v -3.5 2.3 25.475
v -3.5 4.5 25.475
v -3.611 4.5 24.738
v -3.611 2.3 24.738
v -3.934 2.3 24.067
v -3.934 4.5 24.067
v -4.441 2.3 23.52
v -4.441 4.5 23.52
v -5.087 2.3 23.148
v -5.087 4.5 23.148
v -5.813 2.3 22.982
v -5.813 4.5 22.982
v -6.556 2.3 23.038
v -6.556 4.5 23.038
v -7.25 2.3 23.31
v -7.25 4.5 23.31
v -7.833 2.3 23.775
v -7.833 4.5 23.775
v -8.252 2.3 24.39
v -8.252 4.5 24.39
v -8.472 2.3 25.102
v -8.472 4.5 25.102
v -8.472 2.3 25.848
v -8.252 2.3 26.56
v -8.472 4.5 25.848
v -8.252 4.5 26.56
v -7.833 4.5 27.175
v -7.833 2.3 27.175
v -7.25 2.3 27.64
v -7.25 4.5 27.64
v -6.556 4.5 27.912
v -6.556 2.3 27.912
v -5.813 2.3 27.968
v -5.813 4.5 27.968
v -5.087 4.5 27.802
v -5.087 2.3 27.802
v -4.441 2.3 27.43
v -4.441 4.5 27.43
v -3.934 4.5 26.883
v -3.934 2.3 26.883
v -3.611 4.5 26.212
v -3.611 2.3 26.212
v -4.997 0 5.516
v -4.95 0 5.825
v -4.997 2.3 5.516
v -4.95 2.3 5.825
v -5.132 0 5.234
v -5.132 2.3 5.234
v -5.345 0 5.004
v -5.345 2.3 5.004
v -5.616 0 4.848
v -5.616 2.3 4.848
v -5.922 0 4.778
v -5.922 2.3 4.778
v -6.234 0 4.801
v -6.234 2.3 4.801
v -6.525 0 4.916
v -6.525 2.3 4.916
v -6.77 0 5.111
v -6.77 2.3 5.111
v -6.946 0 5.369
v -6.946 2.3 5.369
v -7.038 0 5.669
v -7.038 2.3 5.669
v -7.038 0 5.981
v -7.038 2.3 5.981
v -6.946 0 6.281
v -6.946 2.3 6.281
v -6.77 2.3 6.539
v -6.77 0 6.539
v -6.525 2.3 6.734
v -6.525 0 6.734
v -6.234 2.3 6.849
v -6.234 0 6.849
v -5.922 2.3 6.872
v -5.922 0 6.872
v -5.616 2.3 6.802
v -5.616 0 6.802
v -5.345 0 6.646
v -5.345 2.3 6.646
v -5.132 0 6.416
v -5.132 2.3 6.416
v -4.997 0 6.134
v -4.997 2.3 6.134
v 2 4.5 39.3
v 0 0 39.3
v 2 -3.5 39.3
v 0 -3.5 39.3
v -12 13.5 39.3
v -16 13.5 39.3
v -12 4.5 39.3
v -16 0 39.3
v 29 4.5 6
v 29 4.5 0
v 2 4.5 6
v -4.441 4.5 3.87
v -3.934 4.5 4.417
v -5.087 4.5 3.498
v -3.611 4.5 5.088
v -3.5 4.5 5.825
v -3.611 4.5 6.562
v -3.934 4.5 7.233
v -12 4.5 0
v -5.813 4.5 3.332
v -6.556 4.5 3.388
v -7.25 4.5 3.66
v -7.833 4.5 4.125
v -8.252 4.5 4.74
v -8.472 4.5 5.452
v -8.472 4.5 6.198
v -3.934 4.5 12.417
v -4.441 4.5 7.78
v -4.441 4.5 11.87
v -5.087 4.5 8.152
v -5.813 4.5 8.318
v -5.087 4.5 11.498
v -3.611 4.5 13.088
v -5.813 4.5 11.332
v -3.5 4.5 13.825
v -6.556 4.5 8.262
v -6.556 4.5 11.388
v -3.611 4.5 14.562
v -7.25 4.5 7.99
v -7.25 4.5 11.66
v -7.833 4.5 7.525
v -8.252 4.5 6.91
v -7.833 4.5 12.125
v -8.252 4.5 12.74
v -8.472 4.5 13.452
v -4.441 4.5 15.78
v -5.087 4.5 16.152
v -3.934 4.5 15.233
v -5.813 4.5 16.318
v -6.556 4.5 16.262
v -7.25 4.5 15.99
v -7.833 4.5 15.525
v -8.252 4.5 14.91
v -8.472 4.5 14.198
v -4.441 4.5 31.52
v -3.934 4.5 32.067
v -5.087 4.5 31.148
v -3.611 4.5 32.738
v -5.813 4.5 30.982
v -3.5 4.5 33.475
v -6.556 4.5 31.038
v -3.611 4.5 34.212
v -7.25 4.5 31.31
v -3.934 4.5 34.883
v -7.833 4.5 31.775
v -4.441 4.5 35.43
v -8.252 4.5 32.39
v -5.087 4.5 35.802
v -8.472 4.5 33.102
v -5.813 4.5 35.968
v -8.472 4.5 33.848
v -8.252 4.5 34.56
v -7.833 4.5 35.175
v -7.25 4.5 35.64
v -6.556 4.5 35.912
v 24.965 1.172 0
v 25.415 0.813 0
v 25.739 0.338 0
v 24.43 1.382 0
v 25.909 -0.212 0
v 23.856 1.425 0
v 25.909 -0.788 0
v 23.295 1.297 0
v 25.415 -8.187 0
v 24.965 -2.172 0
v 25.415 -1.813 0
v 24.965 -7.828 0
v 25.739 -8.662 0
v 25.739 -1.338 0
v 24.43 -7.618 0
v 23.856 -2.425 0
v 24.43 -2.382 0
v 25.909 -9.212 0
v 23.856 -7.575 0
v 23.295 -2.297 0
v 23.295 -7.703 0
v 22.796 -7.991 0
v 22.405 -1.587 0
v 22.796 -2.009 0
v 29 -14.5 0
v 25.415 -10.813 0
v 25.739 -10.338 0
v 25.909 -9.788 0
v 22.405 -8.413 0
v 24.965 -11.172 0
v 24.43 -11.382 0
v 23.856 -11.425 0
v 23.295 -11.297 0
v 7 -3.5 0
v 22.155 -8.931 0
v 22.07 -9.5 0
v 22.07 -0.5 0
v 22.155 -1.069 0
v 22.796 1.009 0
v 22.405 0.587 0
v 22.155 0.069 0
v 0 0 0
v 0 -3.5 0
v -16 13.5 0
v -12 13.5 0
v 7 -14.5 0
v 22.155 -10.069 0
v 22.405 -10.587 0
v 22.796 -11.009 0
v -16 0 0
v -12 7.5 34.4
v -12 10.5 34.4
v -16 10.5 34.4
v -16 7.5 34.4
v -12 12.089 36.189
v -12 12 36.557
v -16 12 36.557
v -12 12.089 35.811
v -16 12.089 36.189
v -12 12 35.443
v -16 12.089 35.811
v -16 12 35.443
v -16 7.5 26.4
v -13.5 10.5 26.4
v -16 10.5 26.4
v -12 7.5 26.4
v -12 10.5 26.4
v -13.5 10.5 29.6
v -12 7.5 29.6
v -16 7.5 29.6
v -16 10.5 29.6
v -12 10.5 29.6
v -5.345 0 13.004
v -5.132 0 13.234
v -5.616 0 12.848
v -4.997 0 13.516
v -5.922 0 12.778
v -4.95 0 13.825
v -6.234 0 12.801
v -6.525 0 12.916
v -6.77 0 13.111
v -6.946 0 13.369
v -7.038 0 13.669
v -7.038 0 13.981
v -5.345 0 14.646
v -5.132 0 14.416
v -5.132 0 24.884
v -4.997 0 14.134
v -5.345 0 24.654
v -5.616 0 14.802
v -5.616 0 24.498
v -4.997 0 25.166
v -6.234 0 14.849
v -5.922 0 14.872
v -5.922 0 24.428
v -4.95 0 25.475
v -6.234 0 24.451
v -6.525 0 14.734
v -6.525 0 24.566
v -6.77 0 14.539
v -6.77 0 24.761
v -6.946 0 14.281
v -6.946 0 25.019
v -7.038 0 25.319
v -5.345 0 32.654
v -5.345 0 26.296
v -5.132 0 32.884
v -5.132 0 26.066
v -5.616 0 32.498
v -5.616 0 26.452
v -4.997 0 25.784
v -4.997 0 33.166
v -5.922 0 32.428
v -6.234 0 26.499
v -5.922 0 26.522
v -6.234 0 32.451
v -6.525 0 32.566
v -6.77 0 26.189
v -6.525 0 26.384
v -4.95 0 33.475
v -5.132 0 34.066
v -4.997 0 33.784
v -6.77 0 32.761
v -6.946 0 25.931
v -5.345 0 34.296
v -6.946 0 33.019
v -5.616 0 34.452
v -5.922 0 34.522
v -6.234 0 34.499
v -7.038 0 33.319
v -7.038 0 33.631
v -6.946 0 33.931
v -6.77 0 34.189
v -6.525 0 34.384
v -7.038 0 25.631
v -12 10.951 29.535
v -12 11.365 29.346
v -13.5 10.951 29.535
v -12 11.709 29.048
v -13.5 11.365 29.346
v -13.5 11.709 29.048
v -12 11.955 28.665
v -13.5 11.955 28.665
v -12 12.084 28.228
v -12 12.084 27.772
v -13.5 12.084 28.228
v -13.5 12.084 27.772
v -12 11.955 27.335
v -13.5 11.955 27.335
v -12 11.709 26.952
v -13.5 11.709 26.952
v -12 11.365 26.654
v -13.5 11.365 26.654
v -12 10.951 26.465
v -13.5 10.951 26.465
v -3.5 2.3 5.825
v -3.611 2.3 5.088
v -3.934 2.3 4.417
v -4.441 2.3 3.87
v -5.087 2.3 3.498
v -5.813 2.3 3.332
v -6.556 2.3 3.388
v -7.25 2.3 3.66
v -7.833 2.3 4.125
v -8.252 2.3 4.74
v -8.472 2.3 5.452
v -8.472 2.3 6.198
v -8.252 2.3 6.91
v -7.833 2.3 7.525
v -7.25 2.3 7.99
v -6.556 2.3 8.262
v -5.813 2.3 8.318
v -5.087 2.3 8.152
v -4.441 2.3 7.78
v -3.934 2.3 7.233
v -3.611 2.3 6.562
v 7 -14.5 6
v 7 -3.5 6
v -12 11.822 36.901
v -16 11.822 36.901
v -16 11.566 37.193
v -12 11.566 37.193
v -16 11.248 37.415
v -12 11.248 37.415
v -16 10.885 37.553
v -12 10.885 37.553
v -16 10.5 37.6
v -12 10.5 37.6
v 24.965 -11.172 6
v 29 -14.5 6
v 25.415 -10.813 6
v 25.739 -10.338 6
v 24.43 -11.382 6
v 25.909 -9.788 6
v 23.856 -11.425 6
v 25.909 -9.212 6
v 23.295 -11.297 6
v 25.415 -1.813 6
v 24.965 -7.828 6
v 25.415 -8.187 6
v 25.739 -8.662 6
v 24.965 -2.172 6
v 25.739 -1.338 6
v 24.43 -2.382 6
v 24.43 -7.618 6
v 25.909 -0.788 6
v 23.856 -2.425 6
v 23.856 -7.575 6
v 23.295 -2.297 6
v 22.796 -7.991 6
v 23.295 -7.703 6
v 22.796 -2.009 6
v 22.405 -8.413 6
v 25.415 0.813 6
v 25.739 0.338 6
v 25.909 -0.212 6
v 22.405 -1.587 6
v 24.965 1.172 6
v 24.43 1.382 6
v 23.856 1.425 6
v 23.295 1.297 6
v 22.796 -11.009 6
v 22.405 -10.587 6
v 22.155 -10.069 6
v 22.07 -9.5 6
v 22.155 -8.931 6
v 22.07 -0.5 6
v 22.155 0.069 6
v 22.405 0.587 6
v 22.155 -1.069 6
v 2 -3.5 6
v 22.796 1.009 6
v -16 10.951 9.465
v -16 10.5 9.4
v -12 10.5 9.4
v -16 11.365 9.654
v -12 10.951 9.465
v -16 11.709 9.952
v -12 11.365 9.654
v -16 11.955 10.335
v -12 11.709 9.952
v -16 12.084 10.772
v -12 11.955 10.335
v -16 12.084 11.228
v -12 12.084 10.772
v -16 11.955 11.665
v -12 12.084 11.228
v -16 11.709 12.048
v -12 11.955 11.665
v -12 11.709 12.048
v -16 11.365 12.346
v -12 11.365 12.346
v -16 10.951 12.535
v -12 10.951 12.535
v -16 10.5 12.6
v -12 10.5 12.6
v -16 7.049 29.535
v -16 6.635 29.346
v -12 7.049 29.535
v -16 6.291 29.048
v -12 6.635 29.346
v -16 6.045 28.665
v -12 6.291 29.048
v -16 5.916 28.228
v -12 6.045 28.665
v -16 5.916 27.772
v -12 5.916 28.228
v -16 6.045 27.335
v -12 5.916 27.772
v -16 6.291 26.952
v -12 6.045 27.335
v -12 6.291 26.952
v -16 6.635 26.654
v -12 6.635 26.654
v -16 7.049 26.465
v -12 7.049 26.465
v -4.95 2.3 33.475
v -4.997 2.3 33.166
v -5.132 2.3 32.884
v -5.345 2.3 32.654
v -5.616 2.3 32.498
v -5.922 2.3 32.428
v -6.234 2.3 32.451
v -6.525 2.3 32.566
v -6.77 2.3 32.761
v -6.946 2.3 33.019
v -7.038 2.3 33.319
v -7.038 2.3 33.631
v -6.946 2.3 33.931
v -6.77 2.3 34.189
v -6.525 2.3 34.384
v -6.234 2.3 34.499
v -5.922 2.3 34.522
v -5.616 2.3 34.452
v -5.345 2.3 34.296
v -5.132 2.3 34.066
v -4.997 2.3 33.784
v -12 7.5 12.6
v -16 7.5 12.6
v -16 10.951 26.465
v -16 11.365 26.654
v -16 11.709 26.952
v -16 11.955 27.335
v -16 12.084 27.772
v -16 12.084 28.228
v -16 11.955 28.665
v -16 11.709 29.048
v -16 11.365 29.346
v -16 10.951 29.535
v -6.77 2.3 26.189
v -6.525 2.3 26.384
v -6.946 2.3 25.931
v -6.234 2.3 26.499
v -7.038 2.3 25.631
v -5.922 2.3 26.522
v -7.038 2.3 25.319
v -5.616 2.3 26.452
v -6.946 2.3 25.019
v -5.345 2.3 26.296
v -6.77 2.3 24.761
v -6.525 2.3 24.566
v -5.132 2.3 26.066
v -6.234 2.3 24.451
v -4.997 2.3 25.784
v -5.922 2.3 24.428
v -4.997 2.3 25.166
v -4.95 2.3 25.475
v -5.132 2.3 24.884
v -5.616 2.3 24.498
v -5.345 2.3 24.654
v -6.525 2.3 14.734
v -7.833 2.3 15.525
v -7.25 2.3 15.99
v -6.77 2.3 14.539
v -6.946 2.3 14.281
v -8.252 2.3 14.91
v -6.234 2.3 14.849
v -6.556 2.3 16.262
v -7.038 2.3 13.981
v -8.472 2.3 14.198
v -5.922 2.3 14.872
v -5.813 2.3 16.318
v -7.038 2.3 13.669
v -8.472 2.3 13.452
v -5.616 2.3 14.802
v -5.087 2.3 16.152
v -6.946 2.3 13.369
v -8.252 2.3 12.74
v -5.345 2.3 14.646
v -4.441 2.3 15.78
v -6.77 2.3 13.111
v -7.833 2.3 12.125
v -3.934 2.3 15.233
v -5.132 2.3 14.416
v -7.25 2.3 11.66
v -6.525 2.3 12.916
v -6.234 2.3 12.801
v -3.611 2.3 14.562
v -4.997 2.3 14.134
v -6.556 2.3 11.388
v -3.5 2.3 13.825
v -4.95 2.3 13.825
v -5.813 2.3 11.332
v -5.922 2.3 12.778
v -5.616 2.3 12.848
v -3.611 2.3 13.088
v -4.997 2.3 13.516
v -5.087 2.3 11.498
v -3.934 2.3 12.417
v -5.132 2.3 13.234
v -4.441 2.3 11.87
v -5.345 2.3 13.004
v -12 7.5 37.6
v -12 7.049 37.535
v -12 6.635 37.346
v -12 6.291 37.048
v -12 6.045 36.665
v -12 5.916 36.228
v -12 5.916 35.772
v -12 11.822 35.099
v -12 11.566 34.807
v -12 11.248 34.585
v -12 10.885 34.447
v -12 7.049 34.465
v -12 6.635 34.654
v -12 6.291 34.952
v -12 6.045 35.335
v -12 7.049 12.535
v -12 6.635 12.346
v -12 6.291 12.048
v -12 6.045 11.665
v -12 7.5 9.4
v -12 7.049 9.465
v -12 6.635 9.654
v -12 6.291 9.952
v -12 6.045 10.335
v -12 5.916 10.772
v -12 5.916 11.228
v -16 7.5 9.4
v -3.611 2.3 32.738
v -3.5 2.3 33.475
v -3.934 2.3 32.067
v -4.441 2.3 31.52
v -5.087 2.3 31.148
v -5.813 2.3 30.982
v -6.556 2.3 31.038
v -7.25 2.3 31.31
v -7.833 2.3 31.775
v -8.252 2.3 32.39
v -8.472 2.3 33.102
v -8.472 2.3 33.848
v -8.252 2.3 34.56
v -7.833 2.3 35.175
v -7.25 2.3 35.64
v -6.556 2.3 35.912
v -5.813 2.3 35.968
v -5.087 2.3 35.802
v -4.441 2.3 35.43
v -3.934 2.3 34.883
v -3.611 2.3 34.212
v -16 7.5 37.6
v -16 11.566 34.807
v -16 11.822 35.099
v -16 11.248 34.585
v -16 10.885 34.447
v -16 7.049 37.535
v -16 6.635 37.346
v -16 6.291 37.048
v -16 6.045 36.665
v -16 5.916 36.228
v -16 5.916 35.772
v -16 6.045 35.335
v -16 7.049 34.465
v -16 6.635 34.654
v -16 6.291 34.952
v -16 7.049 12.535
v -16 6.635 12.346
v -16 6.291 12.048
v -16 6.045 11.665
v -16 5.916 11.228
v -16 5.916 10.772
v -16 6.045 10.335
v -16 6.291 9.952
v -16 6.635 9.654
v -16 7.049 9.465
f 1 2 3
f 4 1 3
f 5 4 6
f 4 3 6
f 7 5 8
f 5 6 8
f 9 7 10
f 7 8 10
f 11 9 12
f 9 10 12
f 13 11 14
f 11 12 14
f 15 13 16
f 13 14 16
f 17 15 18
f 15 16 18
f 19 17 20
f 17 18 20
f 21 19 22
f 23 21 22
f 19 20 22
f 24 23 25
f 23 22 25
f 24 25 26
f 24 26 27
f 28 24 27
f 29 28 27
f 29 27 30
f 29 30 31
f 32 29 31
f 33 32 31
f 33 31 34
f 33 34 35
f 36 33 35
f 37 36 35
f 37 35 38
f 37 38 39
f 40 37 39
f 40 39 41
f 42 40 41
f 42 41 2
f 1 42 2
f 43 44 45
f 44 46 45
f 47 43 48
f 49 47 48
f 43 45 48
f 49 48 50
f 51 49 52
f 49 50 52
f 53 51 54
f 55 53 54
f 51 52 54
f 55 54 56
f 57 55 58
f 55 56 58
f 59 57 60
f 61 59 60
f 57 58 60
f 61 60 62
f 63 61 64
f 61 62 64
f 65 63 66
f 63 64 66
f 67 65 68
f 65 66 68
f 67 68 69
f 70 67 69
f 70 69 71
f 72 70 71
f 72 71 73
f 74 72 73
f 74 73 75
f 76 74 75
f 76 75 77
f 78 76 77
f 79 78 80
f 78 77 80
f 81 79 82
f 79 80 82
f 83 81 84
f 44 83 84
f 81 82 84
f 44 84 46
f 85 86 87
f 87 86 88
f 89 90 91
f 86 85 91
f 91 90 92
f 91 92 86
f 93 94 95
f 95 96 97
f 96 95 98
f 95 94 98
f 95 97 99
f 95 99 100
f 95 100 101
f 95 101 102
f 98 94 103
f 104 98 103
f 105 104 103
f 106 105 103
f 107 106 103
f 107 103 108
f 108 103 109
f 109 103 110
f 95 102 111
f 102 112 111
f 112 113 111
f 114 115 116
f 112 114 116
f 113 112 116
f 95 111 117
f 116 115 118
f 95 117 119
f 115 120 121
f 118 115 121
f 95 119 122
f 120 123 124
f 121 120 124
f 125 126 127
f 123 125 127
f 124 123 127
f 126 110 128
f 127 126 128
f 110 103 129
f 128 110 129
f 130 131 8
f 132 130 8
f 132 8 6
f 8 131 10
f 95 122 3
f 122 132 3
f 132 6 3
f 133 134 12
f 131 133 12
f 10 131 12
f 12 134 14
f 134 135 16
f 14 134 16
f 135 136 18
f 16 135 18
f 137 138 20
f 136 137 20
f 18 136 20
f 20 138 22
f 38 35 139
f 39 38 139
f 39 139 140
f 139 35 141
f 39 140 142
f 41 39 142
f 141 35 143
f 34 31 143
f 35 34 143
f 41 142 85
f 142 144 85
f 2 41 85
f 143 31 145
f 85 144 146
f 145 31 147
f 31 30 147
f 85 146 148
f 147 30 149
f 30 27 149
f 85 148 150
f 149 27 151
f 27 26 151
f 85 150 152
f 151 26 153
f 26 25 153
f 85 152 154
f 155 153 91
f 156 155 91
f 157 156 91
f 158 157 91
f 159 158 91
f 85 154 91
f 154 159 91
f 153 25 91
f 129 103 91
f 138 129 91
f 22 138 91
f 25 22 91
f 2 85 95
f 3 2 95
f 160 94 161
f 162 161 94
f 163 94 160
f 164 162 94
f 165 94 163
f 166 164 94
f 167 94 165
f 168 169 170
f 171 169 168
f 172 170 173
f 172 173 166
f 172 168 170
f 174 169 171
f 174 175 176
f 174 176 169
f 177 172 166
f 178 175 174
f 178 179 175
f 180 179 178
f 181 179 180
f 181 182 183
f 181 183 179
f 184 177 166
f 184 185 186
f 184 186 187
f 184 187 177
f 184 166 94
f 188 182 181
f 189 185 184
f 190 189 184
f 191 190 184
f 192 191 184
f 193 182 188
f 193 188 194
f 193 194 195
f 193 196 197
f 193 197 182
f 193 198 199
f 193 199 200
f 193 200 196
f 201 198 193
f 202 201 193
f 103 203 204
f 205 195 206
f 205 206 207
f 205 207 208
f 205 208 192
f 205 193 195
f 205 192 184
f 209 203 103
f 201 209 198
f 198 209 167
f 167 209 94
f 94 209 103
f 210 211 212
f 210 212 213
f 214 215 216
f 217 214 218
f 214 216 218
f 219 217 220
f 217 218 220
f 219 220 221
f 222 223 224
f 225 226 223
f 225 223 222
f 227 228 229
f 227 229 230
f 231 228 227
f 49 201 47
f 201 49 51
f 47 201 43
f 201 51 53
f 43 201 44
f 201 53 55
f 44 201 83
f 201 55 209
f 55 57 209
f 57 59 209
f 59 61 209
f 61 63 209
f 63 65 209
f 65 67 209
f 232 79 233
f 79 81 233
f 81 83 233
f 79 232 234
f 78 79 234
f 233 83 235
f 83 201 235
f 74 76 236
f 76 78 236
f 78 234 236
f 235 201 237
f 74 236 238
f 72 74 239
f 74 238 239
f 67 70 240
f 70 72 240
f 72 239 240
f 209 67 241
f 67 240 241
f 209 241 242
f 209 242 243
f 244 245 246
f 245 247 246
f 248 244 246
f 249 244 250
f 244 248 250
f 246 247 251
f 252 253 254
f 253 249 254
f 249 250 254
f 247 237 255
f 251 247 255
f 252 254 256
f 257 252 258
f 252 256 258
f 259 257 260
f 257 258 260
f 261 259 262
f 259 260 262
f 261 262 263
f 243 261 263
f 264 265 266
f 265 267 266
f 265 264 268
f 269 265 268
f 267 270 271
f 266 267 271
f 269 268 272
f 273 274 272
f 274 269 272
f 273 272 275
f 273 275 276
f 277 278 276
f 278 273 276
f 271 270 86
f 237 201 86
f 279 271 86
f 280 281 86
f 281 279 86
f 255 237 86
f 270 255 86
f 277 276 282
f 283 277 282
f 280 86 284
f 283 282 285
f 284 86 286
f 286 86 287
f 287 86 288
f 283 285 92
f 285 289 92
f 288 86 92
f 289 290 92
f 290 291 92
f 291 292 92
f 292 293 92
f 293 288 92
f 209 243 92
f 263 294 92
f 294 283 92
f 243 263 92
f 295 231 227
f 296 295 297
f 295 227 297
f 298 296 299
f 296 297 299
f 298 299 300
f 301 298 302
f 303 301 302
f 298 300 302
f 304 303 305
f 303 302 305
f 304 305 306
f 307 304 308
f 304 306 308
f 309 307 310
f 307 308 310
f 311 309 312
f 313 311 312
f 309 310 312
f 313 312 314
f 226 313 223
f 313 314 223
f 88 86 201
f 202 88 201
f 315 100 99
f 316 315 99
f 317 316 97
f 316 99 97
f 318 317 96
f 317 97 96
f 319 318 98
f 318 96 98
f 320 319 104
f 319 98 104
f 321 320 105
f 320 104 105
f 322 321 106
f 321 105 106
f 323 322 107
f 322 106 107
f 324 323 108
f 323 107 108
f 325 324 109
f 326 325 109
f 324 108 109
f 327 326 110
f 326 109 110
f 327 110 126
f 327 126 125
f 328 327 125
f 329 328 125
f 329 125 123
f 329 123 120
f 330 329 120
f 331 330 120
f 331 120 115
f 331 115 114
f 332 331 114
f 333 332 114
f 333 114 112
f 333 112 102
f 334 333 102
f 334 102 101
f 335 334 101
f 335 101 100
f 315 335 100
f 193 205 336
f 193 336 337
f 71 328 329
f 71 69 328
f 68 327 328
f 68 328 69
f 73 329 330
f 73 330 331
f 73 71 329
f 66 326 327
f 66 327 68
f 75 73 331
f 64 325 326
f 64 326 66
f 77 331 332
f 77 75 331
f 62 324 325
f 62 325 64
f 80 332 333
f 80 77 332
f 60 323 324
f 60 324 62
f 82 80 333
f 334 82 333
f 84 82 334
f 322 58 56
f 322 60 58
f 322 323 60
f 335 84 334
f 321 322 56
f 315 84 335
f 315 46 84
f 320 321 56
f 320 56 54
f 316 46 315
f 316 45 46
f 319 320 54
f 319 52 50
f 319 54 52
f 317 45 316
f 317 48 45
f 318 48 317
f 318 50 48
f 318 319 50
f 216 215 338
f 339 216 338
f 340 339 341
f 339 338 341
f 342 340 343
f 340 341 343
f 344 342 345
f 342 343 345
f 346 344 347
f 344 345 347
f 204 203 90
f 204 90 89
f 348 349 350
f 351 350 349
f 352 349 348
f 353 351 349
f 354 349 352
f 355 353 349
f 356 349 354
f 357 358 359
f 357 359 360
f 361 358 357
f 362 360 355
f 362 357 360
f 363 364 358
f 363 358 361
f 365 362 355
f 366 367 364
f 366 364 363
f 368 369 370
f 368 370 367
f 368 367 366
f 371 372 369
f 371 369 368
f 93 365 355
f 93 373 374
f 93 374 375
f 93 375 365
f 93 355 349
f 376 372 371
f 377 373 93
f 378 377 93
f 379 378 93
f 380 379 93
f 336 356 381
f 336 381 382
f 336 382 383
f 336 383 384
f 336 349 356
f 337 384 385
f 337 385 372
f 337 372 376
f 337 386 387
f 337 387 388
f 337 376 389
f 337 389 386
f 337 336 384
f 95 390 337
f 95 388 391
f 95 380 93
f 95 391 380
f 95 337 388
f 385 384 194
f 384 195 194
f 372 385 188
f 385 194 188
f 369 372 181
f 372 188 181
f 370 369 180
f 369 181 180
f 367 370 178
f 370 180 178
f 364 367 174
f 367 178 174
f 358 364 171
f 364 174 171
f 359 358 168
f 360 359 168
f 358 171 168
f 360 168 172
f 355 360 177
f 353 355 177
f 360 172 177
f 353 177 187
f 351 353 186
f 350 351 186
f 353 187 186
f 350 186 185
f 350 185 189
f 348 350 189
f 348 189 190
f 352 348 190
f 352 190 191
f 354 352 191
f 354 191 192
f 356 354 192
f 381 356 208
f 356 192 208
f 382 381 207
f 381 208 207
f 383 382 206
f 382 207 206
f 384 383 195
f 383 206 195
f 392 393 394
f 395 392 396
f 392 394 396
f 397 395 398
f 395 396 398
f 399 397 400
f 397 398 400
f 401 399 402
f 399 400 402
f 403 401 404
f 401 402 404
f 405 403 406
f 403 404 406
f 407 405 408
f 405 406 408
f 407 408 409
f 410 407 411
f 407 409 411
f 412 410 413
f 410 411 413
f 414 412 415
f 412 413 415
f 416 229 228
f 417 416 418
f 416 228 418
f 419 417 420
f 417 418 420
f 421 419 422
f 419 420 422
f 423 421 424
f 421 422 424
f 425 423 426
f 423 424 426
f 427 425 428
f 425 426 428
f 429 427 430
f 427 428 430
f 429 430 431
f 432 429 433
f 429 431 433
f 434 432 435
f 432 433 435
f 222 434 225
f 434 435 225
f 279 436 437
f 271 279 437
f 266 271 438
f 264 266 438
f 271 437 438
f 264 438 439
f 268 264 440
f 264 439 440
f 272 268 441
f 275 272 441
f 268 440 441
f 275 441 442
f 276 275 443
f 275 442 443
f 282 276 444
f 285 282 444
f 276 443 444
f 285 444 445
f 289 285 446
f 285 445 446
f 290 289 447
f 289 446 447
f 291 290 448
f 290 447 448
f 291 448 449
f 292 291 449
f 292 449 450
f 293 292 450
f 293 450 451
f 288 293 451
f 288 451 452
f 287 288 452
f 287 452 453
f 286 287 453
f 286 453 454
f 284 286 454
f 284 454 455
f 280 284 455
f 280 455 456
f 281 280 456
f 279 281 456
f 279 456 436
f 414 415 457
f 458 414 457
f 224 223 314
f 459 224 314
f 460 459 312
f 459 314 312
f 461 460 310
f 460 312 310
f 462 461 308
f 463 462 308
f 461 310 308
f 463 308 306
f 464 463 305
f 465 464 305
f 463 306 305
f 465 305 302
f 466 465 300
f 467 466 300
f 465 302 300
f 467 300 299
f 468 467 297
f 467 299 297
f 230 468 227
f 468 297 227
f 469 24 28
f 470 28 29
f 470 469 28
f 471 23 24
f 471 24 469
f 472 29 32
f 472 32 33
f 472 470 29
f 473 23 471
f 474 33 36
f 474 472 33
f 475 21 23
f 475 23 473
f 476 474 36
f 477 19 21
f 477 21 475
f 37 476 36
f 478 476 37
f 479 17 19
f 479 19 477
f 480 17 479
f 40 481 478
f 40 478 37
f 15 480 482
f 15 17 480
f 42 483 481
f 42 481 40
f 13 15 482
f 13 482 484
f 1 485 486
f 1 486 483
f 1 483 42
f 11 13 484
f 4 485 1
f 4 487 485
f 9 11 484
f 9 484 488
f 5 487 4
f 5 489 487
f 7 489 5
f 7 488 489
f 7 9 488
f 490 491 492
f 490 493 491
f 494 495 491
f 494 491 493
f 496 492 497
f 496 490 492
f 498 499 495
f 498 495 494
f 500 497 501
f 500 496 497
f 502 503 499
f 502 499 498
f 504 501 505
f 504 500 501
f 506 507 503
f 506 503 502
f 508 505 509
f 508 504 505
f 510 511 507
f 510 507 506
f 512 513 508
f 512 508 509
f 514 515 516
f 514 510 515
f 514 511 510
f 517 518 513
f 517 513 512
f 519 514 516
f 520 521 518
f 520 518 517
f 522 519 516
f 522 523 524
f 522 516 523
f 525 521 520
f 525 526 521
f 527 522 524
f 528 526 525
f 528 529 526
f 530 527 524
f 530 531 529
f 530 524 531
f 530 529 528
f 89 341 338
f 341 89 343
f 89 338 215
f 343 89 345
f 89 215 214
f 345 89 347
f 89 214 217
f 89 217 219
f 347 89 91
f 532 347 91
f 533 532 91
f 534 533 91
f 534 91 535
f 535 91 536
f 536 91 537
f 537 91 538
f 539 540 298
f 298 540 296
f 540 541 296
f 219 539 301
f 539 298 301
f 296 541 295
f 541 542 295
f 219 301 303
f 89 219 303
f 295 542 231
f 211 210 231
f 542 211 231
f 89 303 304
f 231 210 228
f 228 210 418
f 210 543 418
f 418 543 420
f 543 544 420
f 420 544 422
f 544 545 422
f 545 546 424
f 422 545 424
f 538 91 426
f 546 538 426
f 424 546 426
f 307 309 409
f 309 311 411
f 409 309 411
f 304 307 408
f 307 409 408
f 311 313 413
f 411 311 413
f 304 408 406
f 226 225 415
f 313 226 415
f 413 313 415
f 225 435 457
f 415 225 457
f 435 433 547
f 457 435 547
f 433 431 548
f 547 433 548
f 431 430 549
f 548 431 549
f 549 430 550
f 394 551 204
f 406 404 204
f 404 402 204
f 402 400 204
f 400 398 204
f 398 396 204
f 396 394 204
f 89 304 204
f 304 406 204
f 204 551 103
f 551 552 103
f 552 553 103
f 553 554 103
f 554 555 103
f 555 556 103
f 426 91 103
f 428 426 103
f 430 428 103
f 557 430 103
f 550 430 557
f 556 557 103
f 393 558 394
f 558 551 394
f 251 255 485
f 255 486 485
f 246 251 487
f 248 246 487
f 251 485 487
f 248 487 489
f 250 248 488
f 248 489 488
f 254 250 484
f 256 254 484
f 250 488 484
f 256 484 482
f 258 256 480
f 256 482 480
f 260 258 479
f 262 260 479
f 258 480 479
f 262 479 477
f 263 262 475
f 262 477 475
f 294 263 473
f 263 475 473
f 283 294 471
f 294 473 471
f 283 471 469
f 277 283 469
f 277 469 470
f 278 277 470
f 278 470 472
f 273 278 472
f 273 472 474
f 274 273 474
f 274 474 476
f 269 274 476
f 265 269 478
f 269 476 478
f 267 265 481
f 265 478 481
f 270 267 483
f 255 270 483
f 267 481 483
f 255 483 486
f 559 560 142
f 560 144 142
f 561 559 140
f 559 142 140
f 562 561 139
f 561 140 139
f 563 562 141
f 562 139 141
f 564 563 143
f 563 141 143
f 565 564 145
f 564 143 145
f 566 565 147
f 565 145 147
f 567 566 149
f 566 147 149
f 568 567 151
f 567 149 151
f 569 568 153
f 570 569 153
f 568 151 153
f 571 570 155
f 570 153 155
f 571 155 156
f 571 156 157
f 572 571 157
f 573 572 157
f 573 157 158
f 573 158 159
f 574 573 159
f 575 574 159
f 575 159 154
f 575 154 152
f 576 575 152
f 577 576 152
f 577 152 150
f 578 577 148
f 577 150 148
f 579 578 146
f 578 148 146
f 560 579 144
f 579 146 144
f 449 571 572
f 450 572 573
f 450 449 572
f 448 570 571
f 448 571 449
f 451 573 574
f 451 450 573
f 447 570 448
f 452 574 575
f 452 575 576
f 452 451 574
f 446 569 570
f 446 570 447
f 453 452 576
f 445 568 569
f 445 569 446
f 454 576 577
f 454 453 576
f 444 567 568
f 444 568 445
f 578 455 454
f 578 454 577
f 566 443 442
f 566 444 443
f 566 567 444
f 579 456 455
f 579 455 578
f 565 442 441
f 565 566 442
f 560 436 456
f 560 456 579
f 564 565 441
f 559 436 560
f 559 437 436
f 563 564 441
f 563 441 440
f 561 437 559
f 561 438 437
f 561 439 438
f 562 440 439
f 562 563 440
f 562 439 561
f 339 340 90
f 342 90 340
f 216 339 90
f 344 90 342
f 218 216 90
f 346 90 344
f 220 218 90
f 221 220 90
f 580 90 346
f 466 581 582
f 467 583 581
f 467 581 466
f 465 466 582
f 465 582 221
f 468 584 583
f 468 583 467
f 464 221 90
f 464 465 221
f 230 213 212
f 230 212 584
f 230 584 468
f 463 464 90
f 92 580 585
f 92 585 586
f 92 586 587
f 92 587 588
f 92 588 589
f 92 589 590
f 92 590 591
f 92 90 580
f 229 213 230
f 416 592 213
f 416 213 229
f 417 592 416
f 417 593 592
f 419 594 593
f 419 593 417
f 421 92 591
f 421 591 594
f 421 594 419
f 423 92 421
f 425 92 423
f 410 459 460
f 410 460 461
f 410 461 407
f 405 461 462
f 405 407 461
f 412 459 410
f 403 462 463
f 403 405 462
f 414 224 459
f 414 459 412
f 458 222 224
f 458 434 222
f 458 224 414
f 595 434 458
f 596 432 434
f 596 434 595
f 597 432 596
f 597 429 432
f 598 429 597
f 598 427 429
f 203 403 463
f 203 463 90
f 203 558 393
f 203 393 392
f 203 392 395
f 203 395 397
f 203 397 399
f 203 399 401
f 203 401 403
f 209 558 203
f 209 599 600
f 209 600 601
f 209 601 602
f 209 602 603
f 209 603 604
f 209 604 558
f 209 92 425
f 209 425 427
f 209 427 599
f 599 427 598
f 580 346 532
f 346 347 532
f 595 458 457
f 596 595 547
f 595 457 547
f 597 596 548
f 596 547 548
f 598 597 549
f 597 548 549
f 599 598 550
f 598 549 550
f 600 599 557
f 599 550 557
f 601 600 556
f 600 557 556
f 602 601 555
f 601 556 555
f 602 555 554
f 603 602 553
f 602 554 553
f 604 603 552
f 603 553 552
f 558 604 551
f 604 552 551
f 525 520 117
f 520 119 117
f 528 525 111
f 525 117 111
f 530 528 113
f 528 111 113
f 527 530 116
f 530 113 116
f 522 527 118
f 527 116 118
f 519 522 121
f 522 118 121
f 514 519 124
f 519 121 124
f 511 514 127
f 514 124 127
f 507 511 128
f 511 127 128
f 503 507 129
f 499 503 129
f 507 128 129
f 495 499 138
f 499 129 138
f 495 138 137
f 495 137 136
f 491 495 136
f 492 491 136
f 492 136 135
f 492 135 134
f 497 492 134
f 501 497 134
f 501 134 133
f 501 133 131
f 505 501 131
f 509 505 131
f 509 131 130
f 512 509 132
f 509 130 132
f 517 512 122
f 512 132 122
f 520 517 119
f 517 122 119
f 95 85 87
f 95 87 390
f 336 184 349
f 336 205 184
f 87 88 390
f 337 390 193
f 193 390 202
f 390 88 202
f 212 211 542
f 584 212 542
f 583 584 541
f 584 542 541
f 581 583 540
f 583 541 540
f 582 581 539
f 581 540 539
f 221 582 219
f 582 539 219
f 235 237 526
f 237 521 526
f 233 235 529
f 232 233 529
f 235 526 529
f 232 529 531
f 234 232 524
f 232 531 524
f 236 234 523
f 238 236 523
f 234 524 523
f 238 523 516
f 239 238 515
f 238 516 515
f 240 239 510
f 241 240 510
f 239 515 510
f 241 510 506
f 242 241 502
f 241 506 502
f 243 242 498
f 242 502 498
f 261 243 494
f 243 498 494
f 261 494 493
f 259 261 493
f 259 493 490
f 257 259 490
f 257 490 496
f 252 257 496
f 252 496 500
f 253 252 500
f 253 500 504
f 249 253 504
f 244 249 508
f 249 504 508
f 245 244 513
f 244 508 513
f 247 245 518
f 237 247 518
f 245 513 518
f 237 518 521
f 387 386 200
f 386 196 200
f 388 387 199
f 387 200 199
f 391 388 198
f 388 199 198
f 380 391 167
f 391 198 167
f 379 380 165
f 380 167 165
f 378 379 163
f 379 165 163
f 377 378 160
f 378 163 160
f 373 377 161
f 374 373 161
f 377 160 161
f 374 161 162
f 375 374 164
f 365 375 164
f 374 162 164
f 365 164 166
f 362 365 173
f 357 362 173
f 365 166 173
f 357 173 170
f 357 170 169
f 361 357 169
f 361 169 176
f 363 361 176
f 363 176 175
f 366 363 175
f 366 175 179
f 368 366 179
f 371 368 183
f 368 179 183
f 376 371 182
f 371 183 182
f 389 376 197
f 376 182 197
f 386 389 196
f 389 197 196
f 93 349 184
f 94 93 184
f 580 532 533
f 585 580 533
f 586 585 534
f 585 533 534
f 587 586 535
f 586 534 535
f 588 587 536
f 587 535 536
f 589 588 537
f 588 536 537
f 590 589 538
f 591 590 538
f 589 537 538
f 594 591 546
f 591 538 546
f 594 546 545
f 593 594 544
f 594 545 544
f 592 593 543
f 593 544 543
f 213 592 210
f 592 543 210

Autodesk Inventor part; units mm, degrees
ref_plane "YZ Plane" through (0, 0, 0) normal (1, 0, 0) x (0, 1, 0)
ref_plane "XZ Plane" through (0, 0, 0) normal (0, 1, 0) x (-1, 0, 0)
ref_plane "XY Plane" through (0, 0, 0) normal (0, 0, 1) x (1, 0, 0)
sketch "Sketch1" plane through (0, 0, 0) normal (0, 1, 0) x (-1, 0, 0)
  line L0 (0, 0) -> (16, 0)
  line L1 (16, 0) -> (16, 40.3)
  line L2 (16, 40.3) -> (0, 40.3)
  line L3 (0, 40.3) -> (0, 0)
  dimension "d0" = 16
  dimension "d1" = 40.3
extrude "Extrusion1" add sketch "Sketch1" along normal blind 4.5
sketch "Sketch2" plane through (0, 4.5, 0) normal (0, 1, 0) x (1, 0, 0)
  line L0 (0, -40.3) -> (0, 0) projected
  line L1 (0, 0) -> (-6, 0)
  line L2 (0, 0) -> (-16, 0) projected
  line L3 (-6, 0) -> (-6, -5.825)
  line L4 (-6, -5.825) -> (-6, -13.825)
  line L5 (-6, -13.825) -> (-6, -25.475)
  line L6 (-6, -25.475) -> (-6, -33.475)
  circle A0 centre (-6, -33.475) radius 1.05
  circle A1 centre (-6, -25.475) radius 1.05
  circle A2 centre (-6, -13.825) radius 1.05
  circle A3 centre (-6, -5.825) radius 1.05
  dimension "d4" = 6
  dimension "d5" = 5.825
  dimension "d6" = 8
  dimension "d7" = 11.65
  dimension "d8" = 8
  dimension "d9" = 2.1
  dimension "d10" = 2.1
  dimension "d11" = 2.1
  dimension "d12" = 2.1
extrude "Extrusion2" cut sketch "Sketch2" against normal blind 5
sketch "Sketch3" plane through (0, 4.5, 0) normal (0, 1, 0) x (1, 0, 0)
  circle A0 centre (-6, -5.825) radius 1.05 projected
  circle A1 centre (-6, -5.825) radius 2.5
  circle A2 centre (-6, -13.825) radius 1.05 projected
  circle A3 centre (-6, -13.825) radius 2.5
  circle A4 centre (-6, -25.475) radius 1.05 projected
  circle A5 centre (-6, -25.475) radius 2.5
  circle A6 centre (-6, -33.475) radius 1.05 projected
  circle A7 centre (-6, -33.475) radius 2.5
  point P0 (0, 0)
  dimension "d15" = 5
  dimension "d16" = 5
  dimension "d17" = 5
  dimension "d18" = 5
extrude "Extrusion3" cut sketch "Sketch3" against normal blind 2.2
sketch "Sketch4" plane through (-16, 0, 40.3) normal (0, 0, 1) x (1, 0, 0)
  line L0 (16, 4.5) -> (0, 4.5) projected
  line L1 (0, 0) -> (16, 0)
  line L2 (16, 0) -> (16, 4.5)
  line L3 (16, 4.5) -> (0, 4.5)
  line L4 (0, 4.5) -> (0, 0)
  point P0 (0, 4.5)
extrude "Extrusion4" cut sketch "Sketch4" against normal blind 1
sketch "Sketch5" plane through (-16, 0, 39.3) normal (0, 0, 1) x (1, 0, 0)
  line L0 (0, 0) -> (0, 4.5) projected
  line L1 (0, 0) -> (0, 4.5)
  line L2 (0, 4.5) -> (0, 12)
  line L3 (0, 12) -> (4, 12)
  line L4 (4, 12) -> (4, 4.5)
  line L5 (16, 4.5) -> (0, 4.5) projected
  line L6 (4, 4.5) -> (0, 4.5)
  point P0 (16, 0)
  dimension "d23" = 7.5
  dimension "d24" = 4
extrude "Extrusion5" add sketch "Sketch5" against normal blind 39.3
sketch "Sketch6" plane through (-12, 4.5, 39.3) normal (1, 0, 0) x (0, 0, -1)
  line L0 (39.3, 7.5) -> (39.3, 0) projected
  line L1 (39.3, 0) -> (39.3, 3)
  line L2 (39.3, 3) -> (29.9, 3)
  line L3 (28.3, 3) -> (12.9, 3)
  line L4 (11.3, 3) -> (3.3, 3)
  arc A0 (1.7, 3) -> (4.3224, 4.2308) centre (3.3, 3) ccw
  arc A1 (9.7, 3) -> (12.9, 3) centre (11.3, 3) ccw
  arc A2 (26.7, 3) -> (29.9, 3) centre (28.3, 3) ccw
  line L5 (3.3, 3) -> (3.3, 6)
  arc A3 (12.5682, 5.0245) -> (10.0318, 5.0245) centre (11.3, 6) ccw
  line L6 (4.9, 6) -> (4.9, 3)
  line L7 (1.7, 6) -> (1.7, 3)
  arc A4 (4.9, 6) -> (1.7, 6) centre (3.3, 6) ccw
  arc A5 (2.4693, 5) -> (3.3, 4.7) centre (3.3, 6) ccw
  line L8 (11.3, 3) -> (11.3, 3.7)
  line L9 (11.3, 4.3) -> (11.3, 6)
  line L10 (28.3, 3) -> (28.3, 3.7)
  line L11 (9.7, 3) -> (9.7, 6)
  line L12 (12.9, 3) -> (12.9, 6)
  line L13 (28.3, 3) -> (28.3, 6)
  arc A6 (29.9, 6) -> (26.7, 6) centre (28.3, 6) ccw
  line L14 (29.9, 3) -> (29.9, 6)
  line L15 (26.7, 3) -> (26.7, 6)
  point P0 (39.3, -4.5)
  dimension "d27" = 3
  dimension "d28" = 11
  dimension "d29" = 17
  dimension "d30" = 8
  dimension "d36" = 3.2
  dimension "d37" = 3.2
  dimension "d38" = 3.2
  dimension "d39" = 3
  dimension "d40" = 3
  dimension "d43" = 3.2
  dimension "d49" = 3
  dimension "d50" = 3.2
extrude "Extrusion6" cut sketch "Sketch6" against normal blind 4.5 contours A0 L7 A4 L6
sketch "Sketch7" plane through (-16, 12, 39.3) normal (0, 1, 0) x (1, 0, 0)
  line L0 (0, 0) -> (0, 39.3) projected
  line L1 (0, 0) -> (4, 0)
  line L2 (4, 0) -> (4, 39.3)
  line L3 (4, 39.3) -> (0, 39.3)
  line L4 (0, 39.3) -> (0, 0)
  point P0 (16, 39.3)
extrude "Extrusion7" add sketch "Sketch7" along normal blind 1.5
extrude "Extrusion8" cut sketch "Sketch6" along normal mid plane 3 contours A1 L11 A3 L12 | L15 A6 L14 A2
sketch "Sketch8" plane through (0, 0, 0) normal (1, 0, 0) x (0, 0, -1)
  line L0 (0, 0) -> (0, 4.5) projected
  line L1 (0, 0) -> (0, 4.5)
  line L2 (0, 4.5) -> (0, -3.5)
  line L3 (-39.3, 4.5) -> (0, 4.5) projected
  line L4 (0, 4.5) -> (-39.3, 4.5)
  line L5 (-39.3, 4.5) -> (-39.3, -3.5)
  line L6 (-39.3, 0) -> (-39.3, 13.5) projected
  line L7 (-39.3, -3.5) -> (0, -3.5)
  dimension "d53" = 8
extrude "Extrusion9" add sketch "Sketch8" along normal blind 2
sketch "Sketch9" plane through (2, 0, 0) normal (1, 0, 0) x (0, 0, -1)
  line L0 (0, 0) -> (0, 4.5)
  line L1 (0, 4.5) -> (0, -14.5)
  line L2 (0, -14.5) -> (-6, -14.5)
  line L3 (-6, -14.5) -> (-6, 4.5)
  line L4 (-8.325, 4.5) -> (-8.325, 2.3) projected
  line L5 (0, 4.5) -> (-39.3, 4.5) projected
  line L6 (-6, 4.5) -> (0, 4.5)
  dimension "d56" = 19
  dimension "d57" = 6
extrude "Extrusion10" add sketch "Sketch9" along normal blind 27
sketch "Sketch10" plane through (-12, 13.5, 0) normal (0, 0, -1) x (-1, 0, 0)
  line L0 (-14, -9) -> (-41, -9) projected
  line L1 (-41, -9) -> (-36, -9)
  line L2 (-36, -9) -> (-36, -14)
  circle A0 centre (-36, -14) radius 1.9305
  line L3 (-14, -28) -> (-41, -28) projected
  line L4 (-41, -28) -> (-36, -28)
  line L5 (-36, -28) -> (-36, -23)
  circle A1 centre (-36, -23) radius 1.9305
  point P0 (-12, -13.5)
  dimension "d60" = 5
  dimension "d61" = 5
  dimension "d62" = 3.861
  dimension "d63" = 5
  dimension "d64" = 5
  dimension "d65" = 3.861
extrude "Extrusion11" cut sketch "Sketch10" against normal blind 20
sketch "Sketch11" plane through (-12, 13.5, 0) normal (0, 0, -1) x (-1, 0, 0)
  line L0 (-14, -28) -> (-41, -28) projected
  line L1 (-14, -28) -> (-19, -28)
  line L2 (-19, -28) -> (-19, -17)
  line L3 (-19, -17) -> (-14, -17)
  line L4 (-14, -17) -> (-14, -28)
  point P0 (-12, -13.5)
  point P1 (-19, -28)
  dimension "d68" = 5
  dimension "d69" = 11
extrude "Extrusion12" cut sketch "Sketch11" against normal blind 25
sketch "Sketch12" plane through (-13.5, 4.5, 39.3) normal (1, 0, 0) x (0, 0, -1)
  arc A0 (12.9, 6) -> (9.7, 6) centre (11.3, 6) ccw projected
  circle A1 centre (11.3, 6) radius 1.6
  arc A2 (9.7, 3) -> (12.9, 3) centre (11.3, 3) ccw projected
  circle A3 centre (11.3, 3) radius 1.6
  line L0 (9.7, 3) -> (9.7, 6) projected
  line L1 (9.7, 6) -> (9.7, 3)
  line L2 (12.9, 6) -> (12.9, 3) projected
  line L3 (12.9, 6) -> (12.9, 3)
  arc A4 (26.7, 3) -> (29.9, 3) centre (28.3, 3) ccw projected
  line L4 (11.3, 3) -> (28.3, 3)
  line L5 (28.3, 3) -> (19.8, 3)
  line L6 (19.8, 3) -> (19.8, 4.3)
  arc A5 (29.9, 6) -> (26.7, 6) centre (28.3, 6) ccw
  circle A6 centre (28.3, 6) radius 1.6
  circle A7 centre (28.3, 3) radius 1.6
  line L7 (29.9, 3) -> (29.9, 6)
  line L8 (29.9, 6) -> (29.9, 3)
  line L9 (26.7, 6) -> (26.7, 3)
  line L10 (26.7, 6) -> (26.7, 3)
  point P0 (39.3, -4.5)
extrude "Extrusion13" cut sketch "Sketch12" against normal blind 3
sketch "Sketch13" plane through (-12, 4.5, 39.3) normal (1, 0, 0) x (0, 0, -1)
  arc A0 (4.9, 6) -> (3.8568, 7.5) centre (3.3, 6) ccw projected
  circle A1 centre (3.3, 6) radius 1.6
  point P0 (39.3, -4.5)
  point P1 (4.9, 6)
  dimension "d74" = 3.2
extrude "Extrusion14" cut sketch "Sketch13" along normal mid plane 8
properties part number "Non_compliant_plate"
